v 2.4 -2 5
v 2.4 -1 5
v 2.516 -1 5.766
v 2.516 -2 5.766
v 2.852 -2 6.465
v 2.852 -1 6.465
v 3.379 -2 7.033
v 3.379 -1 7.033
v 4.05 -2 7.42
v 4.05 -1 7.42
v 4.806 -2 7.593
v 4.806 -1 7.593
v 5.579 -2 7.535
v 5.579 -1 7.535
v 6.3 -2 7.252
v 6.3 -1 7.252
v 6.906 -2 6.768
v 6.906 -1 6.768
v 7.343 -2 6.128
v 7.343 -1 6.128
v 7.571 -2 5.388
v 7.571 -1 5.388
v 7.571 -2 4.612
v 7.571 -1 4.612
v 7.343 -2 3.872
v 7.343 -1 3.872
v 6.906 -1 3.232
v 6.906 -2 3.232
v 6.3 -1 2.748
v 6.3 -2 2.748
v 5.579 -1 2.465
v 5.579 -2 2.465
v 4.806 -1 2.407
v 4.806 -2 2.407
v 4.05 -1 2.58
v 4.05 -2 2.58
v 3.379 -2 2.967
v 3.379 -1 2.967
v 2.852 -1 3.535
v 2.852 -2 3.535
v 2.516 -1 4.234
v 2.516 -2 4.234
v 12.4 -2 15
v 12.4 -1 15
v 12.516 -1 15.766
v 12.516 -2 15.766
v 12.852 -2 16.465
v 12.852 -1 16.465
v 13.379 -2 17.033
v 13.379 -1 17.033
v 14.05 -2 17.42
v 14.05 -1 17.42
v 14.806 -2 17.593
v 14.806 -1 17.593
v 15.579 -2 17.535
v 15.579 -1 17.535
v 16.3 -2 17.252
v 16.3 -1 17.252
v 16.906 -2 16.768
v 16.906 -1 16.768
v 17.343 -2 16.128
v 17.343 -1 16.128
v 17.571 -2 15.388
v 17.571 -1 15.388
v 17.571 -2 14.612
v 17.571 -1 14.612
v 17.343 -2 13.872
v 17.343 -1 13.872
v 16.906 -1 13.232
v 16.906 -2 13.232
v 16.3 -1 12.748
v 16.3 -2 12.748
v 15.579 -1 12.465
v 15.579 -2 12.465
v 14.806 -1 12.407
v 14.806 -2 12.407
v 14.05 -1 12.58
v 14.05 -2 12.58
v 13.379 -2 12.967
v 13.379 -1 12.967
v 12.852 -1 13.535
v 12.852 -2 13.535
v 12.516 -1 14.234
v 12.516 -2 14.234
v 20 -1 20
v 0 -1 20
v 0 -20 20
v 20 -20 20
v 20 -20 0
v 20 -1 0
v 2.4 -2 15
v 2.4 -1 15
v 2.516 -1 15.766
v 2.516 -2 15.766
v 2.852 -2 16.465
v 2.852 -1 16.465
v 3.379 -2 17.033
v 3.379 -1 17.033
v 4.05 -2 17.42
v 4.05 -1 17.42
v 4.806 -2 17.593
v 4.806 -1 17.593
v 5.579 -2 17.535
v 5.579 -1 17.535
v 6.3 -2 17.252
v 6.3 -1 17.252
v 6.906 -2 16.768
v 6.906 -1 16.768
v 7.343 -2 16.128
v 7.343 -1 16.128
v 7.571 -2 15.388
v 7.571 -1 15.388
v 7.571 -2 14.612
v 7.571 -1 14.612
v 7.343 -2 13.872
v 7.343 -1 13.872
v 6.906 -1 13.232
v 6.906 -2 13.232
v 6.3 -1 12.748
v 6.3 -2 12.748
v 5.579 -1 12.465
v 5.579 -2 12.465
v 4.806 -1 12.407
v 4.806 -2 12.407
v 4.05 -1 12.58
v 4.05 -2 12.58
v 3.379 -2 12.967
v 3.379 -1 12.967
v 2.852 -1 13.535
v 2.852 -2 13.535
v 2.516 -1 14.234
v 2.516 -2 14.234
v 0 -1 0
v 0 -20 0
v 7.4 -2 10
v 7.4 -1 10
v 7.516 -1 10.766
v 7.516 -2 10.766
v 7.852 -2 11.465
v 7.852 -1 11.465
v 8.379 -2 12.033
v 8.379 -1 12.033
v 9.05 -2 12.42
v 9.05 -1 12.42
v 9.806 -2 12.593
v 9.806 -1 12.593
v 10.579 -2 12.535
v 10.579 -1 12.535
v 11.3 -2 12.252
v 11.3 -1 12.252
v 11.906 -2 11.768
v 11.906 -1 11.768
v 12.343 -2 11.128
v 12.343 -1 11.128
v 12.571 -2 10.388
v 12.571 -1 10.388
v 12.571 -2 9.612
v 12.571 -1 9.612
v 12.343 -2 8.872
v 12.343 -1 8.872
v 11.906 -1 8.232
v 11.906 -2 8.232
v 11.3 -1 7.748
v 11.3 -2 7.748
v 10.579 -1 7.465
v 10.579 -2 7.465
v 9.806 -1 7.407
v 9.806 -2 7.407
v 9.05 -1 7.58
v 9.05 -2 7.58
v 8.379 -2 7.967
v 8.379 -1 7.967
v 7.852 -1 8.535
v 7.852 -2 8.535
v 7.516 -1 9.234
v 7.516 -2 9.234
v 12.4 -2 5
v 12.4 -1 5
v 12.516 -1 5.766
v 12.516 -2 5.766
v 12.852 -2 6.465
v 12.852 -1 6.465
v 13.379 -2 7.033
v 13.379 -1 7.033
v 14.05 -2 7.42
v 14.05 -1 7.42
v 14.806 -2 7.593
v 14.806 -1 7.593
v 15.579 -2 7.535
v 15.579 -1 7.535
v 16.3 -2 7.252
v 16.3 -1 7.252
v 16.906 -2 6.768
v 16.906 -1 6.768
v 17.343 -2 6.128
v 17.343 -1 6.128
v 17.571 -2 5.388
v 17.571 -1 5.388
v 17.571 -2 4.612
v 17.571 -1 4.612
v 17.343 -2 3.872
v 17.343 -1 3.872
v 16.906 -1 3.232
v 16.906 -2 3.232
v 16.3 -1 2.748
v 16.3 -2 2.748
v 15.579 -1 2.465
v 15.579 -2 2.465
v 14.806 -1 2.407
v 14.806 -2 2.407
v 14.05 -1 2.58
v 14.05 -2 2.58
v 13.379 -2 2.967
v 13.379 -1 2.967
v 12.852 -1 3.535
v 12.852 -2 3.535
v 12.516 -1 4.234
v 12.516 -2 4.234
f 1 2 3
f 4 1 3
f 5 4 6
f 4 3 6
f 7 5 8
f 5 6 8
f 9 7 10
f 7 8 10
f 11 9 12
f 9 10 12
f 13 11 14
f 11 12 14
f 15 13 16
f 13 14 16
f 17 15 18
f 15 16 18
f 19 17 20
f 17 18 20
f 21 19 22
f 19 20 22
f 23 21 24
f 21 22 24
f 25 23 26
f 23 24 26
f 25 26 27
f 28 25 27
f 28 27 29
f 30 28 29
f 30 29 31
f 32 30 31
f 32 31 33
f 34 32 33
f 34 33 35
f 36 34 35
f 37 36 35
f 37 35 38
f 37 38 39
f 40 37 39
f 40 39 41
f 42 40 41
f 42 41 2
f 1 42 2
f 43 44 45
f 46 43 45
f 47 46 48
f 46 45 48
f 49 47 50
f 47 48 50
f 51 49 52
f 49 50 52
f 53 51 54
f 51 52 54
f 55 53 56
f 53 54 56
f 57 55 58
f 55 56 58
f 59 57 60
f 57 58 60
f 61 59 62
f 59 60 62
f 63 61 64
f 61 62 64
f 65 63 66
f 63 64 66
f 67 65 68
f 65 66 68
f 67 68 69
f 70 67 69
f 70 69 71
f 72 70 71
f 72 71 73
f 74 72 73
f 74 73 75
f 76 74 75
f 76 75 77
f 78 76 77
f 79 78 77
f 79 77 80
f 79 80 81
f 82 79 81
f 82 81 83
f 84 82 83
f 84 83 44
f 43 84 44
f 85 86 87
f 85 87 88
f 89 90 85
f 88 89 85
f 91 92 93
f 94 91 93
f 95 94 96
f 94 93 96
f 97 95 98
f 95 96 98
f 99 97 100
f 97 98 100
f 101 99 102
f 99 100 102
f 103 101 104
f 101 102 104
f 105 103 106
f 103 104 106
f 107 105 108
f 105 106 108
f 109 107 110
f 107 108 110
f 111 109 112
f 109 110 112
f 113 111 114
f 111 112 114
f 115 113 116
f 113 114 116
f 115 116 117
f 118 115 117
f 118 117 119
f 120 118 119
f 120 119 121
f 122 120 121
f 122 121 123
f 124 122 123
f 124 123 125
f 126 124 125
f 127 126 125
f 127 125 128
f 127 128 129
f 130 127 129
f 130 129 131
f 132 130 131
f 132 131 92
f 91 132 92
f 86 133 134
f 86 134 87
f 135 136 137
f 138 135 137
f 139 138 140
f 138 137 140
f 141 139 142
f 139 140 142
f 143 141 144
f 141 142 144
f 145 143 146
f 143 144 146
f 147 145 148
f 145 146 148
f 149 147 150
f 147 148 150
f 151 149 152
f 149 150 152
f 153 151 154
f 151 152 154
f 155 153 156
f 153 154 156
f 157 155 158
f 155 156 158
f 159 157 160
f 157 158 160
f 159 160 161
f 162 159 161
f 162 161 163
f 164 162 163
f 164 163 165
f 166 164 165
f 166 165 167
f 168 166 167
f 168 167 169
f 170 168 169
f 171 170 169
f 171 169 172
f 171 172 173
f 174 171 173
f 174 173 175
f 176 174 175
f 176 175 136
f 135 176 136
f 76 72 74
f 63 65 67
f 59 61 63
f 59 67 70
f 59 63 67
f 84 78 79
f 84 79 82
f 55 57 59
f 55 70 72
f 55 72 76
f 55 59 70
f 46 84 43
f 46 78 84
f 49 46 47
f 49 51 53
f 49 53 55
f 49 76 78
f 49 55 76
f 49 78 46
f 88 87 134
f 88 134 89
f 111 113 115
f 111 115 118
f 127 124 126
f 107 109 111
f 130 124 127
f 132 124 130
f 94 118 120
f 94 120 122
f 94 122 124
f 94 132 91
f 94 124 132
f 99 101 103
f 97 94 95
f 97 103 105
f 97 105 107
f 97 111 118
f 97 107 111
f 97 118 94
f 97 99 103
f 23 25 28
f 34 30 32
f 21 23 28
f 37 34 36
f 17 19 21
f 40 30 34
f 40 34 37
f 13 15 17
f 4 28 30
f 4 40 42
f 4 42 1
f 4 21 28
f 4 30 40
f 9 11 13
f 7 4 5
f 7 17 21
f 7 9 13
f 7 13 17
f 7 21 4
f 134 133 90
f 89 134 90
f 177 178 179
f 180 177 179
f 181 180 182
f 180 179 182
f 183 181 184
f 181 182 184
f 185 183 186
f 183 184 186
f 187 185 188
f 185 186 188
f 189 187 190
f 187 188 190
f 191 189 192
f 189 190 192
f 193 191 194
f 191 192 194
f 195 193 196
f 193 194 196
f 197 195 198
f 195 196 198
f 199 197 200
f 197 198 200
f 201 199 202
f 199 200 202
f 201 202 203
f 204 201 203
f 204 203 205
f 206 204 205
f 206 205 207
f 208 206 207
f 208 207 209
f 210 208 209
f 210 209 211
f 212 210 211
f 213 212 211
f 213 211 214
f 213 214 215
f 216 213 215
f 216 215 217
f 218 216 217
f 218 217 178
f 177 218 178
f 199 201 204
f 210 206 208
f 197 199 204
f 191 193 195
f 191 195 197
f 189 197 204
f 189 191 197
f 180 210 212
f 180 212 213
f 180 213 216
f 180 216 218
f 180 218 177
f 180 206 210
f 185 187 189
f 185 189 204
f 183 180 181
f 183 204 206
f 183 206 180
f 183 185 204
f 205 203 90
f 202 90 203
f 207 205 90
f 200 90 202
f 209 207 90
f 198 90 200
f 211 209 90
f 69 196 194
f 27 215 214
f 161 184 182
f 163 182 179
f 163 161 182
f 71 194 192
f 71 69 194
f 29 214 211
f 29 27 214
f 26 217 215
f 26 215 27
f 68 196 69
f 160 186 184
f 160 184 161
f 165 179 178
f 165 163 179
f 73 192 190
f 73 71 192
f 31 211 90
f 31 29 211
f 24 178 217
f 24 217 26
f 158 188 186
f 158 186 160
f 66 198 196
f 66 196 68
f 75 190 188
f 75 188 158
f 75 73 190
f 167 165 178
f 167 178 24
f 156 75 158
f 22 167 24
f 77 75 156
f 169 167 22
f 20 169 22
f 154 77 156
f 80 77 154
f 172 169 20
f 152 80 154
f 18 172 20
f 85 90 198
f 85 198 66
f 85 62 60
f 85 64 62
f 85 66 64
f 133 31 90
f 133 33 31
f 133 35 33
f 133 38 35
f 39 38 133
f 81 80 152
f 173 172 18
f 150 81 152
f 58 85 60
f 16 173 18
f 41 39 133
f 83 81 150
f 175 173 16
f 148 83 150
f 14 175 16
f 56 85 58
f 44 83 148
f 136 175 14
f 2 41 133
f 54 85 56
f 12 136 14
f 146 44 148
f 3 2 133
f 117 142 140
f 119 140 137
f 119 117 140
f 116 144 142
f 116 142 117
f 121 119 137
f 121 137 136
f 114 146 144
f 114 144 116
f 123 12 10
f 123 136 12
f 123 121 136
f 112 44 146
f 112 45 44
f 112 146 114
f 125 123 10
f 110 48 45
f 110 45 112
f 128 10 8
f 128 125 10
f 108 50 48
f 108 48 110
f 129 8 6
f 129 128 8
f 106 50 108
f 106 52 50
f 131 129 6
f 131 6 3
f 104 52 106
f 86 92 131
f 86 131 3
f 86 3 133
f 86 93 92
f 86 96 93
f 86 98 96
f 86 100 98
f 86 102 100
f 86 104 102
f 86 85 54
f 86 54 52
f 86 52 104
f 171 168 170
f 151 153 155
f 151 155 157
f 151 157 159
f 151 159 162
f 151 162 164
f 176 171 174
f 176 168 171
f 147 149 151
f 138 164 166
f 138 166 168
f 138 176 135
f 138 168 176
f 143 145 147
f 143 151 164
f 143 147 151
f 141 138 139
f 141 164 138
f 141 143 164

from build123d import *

# Parameters (mm, degrees)
F0_W     = 20
F0_H     = 20
F1_DEPTH = 20
F3_W     = 20
F3_H     = 20
F3_R     = 2.6
F6_DEPTH = 1
F5_R     = 2.6
F4_R     = 2.6
F8_DEPTH = 2


with BuildPart() as f1:
    # F0 (on Front) → F1 (new body)
    with BuildSketch(Plane.XZ):
        with Locations((10, 10)):
            Rectangle(F0_W, F0_H)
    extrude(amount=F1_DEPTH)

    # F3 (on face) → F6 (cut)
    with BuildSketch(Plane(origin=(0, 0, 0), x_dir=(-1, 0, 0), z_dir=(0, 1, 0))):
        with Locations((-10, 10)):
            Rectangle(F3_W, F3_H)
        with Locations((-15, 5)):
            Circle(F3_R, mode=Mode.SUBTRACT)
        with Locations((-5, 5)):
            Circle(F3_R, mode=Mode.SUBTRACT)
        with Locations((-15, 15)):
            Circle(F3_R, mode=Mode.SUBTRACT)
        with Locations((-10, 10)):
            Circle(F3_R, mode=Mode.SUBTRACT)
        with Locations((-5, 15)):
            Circle(F3_R, mode=Mode.SUBTRACT)
        with Locations((-5, 15)):
            Circle(F3_R)
    extrude(amount=-F6_DEPTH, mode=Mode.SUBTRACT)

    # F5 (on face) + F4 (on face) → F8 (cut)
    with BuildSketch(Plane(origin=(0, 0, 0), x_dir=(-1, 0, 0), z_dir=(0, 1, 0))):
        with Locations((-15, 15)):
            Circle(F5_R)
        with Locations((-5, 15)):
            Circle(F5_R)
        with Locations((-10, 10)):
            Circle(F5_R)
        with Locations((-5, 5)):
            Circle(F5_R)
    with BuildSketch(Plane(origin=(0, 0, 0), x_dir=(-1, 0, 0), z_dir=(0, 1, 0))):
        with Locations((-15, 5)):
            Circle(F4_R)
    extrude(amount=-F8_DEPTH, mode=Mode.SUBTRACT)


solid = f1.part
